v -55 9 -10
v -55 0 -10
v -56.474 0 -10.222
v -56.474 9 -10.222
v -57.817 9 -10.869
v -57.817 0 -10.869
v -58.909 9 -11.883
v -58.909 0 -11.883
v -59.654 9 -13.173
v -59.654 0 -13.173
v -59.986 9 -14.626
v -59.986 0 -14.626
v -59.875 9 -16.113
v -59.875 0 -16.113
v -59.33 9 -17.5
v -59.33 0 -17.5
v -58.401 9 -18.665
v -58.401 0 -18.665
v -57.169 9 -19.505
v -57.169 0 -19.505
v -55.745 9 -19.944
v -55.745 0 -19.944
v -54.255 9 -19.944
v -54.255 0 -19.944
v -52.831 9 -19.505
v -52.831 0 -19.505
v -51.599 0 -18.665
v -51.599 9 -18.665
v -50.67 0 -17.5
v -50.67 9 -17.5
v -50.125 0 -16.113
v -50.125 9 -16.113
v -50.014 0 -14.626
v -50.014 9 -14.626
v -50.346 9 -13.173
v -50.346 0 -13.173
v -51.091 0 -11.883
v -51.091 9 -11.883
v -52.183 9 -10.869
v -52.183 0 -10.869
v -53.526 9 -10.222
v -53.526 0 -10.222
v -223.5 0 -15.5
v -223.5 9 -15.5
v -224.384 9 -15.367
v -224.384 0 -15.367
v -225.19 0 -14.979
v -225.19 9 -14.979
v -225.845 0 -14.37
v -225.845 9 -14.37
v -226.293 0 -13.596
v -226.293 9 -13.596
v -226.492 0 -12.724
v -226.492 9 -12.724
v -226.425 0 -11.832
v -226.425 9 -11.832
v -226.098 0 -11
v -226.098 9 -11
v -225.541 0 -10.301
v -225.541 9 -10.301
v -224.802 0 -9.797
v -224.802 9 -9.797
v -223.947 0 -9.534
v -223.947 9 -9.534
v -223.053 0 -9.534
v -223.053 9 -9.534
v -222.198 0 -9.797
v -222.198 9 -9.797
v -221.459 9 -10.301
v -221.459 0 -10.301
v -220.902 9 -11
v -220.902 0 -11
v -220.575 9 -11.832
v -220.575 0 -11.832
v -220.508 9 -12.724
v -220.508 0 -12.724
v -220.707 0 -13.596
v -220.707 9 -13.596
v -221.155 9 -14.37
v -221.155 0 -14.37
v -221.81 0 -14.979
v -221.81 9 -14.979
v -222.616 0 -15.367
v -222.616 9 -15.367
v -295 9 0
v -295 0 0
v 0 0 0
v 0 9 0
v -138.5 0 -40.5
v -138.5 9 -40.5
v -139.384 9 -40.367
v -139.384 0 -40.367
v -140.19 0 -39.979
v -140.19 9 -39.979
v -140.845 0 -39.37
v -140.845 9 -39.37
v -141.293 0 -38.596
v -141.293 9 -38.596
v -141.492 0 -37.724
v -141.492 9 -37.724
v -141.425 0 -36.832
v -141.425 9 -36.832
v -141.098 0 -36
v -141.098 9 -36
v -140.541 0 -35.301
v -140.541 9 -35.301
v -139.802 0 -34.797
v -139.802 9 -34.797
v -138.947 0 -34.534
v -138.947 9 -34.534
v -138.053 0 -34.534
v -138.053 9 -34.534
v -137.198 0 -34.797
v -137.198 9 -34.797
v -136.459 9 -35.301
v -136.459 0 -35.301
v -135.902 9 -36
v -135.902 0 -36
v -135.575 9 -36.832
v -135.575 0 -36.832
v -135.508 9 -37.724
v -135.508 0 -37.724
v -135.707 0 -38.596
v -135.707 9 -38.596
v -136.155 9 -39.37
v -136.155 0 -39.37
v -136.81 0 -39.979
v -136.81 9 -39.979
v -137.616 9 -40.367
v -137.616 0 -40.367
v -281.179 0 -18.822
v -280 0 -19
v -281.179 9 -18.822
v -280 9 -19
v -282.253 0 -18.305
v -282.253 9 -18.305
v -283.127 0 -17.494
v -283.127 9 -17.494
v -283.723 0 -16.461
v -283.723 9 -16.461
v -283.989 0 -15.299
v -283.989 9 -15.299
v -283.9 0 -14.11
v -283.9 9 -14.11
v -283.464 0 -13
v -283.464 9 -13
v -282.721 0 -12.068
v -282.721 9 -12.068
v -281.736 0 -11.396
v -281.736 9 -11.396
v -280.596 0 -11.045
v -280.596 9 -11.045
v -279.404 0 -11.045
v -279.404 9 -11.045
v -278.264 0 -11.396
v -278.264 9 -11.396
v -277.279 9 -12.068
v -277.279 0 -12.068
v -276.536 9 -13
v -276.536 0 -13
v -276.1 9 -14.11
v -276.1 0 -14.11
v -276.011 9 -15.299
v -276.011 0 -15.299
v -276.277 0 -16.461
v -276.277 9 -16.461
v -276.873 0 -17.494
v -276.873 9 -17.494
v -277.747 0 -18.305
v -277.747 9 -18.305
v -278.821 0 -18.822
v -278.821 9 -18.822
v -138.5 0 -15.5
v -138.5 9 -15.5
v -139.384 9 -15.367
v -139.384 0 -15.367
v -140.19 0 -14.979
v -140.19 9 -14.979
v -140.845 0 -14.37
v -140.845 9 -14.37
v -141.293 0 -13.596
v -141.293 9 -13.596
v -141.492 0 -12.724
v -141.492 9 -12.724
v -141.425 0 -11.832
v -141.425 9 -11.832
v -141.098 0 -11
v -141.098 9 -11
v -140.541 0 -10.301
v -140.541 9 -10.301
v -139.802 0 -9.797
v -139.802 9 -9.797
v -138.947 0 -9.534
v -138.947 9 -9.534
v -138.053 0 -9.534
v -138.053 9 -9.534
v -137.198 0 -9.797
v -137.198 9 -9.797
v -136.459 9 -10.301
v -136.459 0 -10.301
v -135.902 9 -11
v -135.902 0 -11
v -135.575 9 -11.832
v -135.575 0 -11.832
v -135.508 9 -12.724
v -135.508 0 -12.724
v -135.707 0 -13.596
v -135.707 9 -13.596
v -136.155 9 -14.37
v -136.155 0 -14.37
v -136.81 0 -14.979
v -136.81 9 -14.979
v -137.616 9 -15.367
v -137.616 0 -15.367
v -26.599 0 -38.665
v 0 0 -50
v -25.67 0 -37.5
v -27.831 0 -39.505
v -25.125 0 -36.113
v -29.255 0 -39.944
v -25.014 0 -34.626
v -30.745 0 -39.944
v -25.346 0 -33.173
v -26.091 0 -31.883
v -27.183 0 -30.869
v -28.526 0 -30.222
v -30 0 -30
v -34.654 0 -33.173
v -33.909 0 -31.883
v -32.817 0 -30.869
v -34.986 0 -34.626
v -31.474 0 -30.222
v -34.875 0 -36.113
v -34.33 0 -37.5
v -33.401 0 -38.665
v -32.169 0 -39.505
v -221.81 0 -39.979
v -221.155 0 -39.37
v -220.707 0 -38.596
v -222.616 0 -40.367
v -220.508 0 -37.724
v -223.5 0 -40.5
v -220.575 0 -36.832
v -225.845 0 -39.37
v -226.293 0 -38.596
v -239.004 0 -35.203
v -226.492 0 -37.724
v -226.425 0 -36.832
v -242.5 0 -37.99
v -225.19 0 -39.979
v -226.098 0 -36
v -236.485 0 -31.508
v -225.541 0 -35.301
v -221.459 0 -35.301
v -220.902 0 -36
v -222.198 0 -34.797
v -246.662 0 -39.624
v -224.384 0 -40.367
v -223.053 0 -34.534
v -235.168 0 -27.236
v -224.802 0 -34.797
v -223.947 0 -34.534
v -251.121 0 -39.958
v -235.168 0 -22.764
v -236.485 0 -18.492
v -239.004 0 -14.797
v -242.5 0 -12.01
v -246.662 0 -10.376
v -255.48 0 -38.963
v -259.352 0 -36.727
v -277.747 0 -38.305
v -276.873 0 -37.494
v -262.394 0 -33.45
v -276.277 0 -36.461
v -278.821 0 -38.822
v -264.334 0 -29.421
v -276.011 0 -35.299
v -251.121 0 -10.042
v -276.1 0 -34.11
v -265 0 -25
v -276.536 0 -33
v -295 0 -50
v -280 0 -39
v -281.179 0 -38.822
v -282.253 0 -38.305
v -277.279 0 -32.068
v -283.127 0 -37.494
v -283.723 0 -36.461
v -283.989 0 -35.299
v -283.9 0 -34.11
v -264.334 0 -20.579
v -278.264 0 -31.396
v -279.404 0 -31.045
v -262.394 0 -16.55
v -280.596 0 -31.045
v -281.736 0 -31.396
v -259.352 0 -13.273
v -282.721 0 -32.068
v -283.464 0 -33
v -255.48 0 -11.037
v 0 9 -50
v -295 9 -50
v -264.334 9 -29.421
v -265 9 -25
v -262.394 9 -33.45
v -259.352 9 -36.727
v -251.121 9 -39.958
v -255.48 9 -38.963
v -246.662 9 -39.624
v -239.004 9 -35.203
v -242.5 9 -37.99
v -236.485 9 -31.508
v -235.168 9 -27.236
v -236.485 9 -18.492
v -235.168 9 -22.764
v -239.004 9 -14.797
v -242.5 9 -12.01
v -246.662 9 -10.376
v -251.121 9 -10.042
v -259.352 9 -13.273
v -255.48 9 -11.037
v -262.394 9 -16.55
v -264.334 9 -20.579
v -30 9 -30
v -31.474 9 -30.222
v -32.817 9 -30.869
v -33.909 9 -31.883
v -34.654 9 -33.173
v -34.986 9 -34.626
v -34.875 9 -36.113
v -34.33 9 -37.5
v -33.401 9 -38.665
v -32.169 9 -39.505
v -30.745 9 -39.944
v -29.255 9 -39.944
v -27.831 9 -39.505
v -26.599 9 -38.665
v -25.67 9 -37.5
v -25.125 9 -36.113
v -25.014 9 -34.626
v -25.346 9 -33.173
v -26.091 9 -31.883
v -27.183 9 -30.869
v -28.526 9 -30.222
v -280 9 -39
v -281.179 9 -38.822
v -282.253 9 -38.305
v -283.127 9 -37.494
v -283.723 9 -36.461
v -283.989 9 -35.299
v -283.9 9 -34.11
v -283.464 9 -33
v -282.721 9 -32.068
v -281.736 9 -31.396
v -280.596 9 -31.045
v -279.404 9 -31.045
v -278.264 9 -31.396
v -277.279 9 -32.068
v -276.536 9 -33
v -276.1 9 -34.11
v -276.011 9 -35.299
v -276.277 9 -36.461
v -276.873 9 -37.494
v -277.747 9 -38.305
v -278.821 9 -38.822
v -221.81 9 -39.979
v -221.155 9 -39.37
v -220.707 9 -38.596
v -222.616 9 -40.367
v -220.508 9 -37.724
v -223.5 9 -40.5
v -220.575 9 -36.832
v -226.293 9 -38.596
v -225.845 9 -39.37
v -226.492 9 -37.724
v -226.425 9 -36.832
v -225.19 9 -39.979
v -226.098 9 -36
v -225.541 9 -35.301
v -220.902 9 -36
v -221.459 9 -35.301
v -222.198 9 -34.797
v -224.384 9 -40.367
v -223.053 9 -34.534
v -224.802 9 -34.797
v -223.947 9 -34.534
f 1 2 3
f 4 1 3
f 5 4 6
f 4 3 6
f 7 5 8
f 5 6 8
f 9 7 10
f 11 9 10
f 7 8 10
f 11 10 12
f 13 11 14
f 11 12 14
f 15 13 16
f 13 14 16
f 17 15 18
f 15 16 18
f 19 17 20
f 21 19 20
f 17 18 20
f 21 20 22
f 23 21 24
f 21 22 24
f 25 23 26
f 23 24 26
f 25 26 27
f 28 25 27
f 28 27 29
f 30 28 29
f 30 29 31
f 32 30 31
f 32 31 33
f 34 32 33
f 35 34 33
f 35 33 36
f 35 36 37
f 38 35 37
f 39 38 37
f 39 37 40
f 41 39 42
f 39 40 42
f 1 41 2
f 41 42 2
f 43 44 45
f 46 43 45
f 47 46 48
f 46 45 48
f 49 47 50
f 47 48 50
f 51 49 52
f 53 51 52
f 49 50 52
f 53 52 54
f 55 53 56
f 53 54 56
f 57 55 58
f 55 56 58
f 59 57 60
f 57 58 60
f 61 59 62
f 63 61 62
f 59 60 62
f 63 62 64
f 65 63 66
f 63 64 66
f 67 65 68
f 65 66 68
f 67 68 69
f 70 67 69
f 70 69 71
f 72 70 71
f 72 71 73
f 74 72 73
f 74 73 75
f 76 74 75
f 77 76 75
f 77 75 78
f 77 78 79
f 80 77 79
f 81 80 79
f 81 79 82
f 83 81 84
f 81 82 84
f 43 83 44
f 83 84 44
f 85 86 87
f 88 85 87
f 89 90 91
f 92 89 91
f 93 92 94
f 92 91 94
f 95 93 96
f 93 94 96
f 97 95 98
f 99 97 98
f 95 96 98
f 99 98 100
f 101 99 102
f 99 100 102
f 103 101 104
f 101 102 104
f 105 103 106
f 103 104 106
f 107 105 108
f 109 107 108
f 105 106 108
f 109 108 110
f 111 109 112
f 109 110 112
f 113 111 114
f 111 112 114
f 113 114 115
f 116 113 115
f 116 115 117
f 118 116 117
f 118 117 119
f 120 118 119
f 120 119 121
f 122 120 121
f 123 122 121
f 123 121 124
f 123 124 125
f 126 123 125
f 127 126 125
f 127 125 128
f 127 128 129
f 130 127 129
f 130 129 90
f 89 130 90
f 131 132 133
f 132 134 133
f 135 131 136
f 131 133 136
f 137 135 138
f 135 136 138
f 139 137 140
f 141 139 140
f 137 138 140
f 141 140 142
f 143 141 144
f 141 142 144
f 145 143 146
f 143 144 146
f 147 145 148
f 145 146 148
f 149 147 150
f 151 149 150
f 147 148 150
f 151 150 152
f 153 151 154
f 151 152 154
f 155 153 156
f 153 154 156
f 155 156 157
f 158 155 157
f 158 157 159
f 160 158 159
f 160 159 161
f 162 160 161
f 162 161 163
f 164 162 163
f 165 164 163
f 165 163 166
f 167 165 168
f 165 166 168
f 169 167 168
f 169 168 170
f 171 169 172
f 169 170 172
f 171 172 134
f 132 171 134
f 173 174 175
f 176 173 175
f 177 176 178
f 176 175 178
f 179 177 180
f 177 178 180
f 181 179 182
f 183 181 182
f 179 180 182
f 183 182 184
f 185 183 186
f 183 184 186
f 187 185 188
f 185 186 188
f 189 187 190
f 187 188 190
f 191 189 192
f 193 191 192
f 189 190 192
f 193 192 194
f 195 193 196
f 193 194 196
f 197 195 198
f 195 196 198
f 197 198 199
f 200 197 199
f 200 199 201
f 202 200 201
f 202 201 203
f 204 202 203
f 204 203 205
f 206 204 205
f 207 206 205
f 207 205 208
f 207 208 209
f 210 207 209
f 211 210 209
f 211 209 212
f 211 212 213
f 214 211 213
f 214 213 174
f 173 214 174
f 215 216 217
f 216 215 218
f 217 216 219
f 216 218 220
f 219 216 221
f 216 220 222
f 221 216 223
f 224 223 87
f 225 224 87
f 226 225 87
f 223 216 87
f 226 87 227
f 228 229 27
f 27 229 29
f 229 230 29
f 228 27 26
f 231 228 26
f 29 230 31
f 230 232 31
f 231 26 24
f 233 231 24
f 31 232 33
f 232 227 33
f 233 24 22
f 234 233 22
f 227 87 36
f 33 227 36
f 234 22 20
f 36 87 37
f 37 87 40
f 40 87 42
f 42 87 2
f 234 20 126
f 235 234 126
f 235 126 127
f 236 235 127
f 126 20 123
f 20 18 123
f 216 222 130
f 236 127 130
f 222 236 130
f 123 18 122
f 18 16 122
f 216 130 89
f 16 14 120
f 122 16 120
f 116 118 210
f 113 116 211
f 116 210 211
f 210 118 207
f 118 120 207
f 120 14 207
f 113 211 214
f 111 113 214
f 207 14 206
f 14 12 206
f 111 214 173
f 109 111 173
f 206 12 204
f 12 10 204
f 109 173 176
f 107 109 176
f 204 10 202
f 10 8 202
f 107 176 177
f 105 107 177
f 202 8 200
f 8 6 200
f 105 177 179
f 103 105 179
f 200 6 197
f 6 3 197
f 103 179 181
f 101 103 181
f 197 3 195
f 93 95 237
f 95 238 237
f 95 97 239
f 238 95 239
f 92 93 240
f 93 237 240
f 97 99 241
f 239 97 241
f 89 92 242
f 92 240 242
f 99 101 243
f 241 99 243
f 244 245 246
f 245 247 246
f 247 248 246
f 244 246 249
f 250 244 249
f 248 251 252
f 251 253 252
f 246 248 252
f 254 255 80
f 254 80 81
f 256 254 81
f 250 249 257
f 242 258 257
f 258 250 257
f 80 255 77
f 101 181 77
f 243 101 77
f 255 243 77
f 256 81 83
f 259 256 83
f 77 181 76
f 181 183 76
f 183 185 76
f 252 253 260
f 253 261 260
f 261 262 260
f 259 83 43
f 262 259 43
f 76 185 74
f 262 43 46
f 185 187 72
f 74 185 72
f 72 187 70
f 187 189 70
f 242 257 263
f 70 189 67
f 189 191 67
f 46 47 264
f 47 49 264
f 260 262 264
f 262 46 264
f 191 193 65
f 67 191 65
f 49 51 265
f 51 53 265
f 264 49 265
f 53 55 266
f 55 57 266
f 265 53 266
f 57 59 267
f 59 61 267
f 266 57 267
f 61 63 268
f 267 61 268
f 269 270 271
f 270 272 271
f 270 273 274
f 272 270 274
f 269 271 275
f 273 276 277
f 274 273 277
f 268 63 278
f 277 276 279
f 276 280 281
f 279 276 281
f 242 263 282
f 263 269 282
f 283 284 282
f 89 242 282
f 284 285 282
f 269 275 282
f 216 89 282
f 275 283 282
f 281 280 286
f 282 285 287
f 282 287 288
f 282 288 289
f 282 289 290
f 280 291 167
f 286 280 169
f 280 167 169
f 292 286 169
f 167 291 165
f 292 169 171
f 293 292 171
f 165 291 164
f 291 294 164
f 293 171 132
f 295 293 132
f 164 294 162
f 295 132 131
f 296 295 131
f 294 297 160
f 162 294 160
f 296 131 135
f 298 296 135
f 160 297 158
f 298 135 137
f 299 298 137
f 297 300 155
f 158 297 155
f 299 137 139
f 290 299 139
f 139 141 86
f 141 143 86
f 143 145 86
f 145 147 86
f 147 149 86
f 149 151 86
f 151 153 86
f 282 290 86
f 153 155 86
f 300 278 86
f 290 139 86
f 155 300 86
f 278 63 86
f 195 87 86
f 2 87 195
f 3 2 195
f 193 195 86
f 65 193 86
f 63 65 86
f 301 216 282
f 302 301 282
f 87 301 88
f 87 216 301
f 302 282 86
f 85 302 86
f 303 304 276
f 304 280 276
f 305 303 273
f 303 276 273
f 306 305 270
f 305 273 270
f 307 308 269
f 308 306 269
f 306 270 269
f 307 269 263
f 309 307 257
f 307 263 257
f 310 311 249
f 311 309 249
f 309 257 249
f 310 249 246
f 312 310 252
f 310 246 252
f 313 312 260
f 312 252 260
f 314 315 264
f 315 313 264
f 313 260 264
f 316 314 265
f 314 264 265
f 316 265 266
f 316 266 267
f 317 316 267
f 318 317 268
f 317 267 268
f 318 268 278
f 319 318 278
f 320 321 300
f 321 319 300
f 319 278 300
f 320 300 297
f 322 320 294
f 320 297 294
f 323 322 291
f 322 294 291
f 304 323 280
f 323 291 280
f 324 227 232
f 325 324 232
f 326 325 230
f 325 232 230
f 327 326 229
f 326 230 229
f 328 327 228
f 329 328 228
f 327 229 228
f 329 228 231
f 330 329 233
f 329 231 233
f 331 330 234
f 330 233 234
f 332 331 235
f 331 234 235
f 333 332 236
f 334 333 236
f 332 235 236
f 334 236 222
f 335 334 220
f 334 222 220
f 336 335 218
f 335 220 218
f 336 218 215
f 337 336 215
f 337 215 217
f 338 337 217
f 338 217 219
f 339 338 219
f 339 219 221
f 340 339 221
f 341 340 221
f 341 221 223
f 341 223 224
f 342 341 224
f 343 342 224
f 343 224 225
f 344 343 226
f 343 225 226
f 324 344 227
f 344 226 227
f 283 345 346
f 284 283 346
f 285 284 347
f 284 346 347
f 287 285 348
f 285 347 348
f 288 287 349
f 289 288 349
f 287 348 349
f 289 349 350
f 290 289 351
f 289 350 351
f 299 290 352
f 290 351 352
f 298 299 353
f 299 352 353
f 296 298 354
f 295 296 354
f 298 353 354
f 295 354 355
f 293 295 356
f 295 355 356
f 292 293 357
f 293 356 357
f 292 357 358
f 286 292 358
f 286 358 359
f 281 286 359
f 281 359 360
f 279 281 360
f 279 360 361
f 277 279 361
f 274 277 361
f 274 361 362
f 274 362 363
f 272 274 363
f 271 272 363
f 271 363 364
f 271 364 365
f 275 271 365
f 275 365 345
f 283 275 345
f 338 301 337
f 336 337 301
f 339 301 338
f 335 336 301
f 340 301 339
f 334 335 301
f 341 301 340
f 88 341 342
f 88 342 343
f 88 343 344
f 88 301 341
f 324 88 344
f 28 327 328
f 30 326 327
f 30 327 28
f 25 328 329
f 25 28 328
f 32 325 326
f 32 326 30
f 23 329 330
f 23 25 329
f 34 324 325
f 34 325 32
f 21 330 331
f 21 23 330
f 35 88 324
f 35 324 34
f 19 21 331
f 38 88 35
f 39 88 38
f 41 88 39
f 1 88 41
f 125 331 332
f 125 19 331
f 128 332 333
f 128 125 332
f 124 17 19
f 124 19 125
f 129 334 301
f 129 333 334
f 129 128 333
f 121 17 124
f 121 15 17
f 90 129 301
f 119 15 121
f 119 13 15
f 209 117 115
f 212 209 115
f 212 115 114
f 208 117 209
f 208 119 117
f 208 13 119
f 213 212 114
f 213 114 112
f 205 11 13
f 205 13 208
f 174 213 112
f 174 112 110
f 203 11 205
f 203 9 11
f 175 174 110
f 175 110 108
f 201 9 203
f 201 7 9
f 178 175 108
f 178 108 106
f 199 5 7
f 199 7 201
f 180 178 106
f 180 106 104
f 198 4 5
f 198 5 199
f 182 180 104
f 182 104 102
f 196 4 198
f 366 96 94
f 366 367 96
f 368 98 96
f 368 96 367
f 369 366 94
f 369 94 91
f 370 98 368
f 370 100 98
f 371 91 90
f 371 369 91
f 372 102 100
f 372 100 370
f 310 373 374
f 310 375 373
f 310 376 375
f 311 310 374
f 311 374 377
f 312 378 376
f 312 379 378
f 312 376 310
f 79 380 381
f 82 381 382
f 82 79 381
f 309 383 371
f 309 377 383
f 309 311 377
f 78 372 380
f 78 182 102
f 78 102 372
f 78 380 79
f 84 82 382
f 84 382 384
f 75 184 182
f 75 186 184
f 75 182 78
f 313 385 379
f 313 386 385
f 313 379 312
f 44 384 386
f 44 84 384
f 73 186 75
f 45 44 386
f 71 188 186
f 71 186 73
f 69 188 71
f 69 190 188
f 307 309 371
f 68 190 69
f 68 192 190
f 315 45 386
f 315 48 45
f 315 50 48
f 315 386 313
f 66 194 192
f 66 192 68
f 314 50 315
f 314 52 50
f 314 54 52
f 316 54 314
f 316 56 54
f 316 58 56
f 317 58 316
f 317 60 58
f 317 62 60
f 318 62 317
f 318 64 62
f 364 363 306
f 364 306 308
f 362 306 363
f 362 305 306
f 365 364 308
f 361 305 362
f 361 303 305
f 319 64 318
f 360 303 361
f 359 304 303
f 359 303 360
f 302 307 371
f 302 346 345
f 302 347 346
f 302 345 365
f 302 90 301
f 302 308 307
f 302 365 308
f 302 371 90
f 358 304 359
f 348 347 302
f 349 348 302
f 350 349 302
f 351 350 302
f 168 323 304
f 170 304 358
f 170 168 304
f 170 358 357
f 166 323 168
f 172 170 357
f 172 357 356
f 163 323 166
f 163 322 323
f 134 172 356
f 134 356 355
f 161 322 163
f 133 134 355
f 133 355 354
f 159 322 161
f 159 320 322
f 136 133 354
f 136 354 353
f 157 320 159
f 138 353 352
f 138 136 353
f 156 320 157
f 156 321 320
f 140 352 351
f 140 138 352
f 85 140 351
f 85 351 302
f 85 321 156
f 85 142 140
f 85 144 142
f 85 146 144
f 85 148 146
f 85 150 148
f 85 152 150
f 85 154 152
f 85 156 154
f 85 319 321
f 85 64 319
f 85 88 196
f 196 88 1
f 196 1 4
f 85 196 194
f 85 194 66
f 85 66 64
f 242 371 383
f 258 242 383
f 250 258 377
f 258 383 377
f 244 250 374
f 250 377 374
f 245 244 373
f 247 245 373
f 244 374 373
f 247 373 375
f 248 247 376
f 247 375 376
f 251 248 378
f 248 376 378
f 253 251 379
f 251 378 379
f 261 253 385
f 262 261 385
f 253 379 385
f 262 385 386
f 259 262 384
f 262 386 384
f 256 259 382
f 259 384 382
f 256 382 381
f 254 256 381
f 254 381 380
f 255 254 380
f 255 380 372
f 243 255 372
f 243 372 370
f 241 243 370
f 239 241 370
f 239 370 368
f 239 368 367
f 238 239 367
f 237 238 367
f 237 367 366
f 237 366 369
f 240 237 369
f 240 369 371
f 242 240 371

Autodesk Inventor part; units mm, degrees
ref_plane "YZ Plane" through (0, 0, 0) normal (1, 0, 0) x (0, 1, 0)
ref_plane "XZ Plane" through (0, 0, 0) normal (0, 1, 0) x (-1, 0, 0)
ref_plane "XY Plane" through (0, 0, 0) normal (0, 0, 1) x (1, 0, 0)
sketch "Skizze1" plane through (0, 0, 0) normal (0, 1, 0) x (-1, 0, 0)
  line L0 (0, 0) -> (275, 0)
  line L1 (275, 0) -> (275, -50)
  line L2 (275, -50) -> (0, -50)
  line L3 (0, -50) -> (0, 0)
  line L4 (275, 0) -> (275, -25)
  line L5 (275, -25) -> (250, -25)
  circle A0 centre (250, -25) radius 15
  line L6 (275, -50) -> (295, -50)
  line L7 (295, -50) -> (295, 0)
  line L8 (295, 0) -> (275, 0)
  dimension "d0" = 275
  dimension "d1" = 50
  dimension "d2" = 25
  dimension "d3" = 30
  dimension "d18" = 20
extrude "Extrusion1" add sketch "Skizze1" along normal blind 9 contours L0 L1 L2 L3
sketch "Skizze2" plane through (0, 9, 0) normal (0, 1, 0) x (1, 0, 0)
  line L0 (0, 0) -> (0, 50) projected
  line L1 (0, 50) -> (-30, 50)
  line L2 (-30, 50) -> (-30, 35)
  line L3 (0, 0) -> (-55, 0)
  line L4 (-275, 0) -> (0, 0) projected
  line L5 (-55, 0) -> (-70, 0)
  line L6 (-70, 0) -> (-55, 0)
  line L7 (-55, 0) -> (-55, 15)
  dimension "d6" = 30
  dimension "d7" = 15
  dimension "d8" = 55
  dimension "d9" = 15
  dimension "d10" = 15
hole "Bohrung1" at (-55, 9, -15) at (-30, 9, -35) direction (0, -1, 0) diameter 10 depth 10 tip angle 118
extrude "Extrusion2" add sketch "Skizze1" along normal blind 9 contours L8 L7 L6 L1
sketch "Skizze3" plane through (0, 0, 0) normal (0, -1, 0) x (1, 0, 0)
  line L0 (0, -50) -> (-295, -50) projected
  line L1 (-295, -50) -> (-280, -50)
  line L2 (-280, -50) -> (-280, -35)
  line L3 (-280, -35) -> (-280, -15)
  line L4 (-280, -15) -> (-280, 0)
  line L5 (-295, 0) -> (0, 0) projected
  dimension "d21" = 15
  dimension "d22" = 15
  dimension "d23" = 20
hole "Bohrung2" at (-280, 0, -15) at (-280, 0, -35) direction (0, 1, 0) diameter 8 depth 9 tip angle 118
sketch "Skizze4" plane through (0, 0, 0) normal (0, -1, 0) x (1, 0, 0)
  circle A0 centre (-250, -25) radius 15 projected
  line L0 (-250, -25) -> (-223.5, -25)
  line L1 (-223.5, -25) -> (-223.5, -37.5)
  line L2 (-223.5, -37.5) -> (-223.5, -12.5)
  line L3 (-223.5, -12.5) -> (-223.5, -25)
  line L4 (-223.5, -25) -> (-138.5, -25)
  line L5 (-138.5, -25) -> (-138.5, -37.5)
  line L6 (-138.5, -37.5) -> (-138.5, -12.5)
  point P0 (0, 0)
  dimension "d31" = 26.5
  dimension "d32" = 12.5
  dimension "d33" = 25
  dimension "d34" = 85
  dimension "d35" = 12.5
  dimension "d36" = 25
hole "Bohrung3" at (-223.5, 0, -12.5) at (-223.5, 0, -37.5) at (-138.5, 0, -37.5) at (-138.5, 0, -12.5) direction (0, 1, 0) diameter 6 end through all
properties part number "Lagerstuetze" material "Holz (Birke)"
